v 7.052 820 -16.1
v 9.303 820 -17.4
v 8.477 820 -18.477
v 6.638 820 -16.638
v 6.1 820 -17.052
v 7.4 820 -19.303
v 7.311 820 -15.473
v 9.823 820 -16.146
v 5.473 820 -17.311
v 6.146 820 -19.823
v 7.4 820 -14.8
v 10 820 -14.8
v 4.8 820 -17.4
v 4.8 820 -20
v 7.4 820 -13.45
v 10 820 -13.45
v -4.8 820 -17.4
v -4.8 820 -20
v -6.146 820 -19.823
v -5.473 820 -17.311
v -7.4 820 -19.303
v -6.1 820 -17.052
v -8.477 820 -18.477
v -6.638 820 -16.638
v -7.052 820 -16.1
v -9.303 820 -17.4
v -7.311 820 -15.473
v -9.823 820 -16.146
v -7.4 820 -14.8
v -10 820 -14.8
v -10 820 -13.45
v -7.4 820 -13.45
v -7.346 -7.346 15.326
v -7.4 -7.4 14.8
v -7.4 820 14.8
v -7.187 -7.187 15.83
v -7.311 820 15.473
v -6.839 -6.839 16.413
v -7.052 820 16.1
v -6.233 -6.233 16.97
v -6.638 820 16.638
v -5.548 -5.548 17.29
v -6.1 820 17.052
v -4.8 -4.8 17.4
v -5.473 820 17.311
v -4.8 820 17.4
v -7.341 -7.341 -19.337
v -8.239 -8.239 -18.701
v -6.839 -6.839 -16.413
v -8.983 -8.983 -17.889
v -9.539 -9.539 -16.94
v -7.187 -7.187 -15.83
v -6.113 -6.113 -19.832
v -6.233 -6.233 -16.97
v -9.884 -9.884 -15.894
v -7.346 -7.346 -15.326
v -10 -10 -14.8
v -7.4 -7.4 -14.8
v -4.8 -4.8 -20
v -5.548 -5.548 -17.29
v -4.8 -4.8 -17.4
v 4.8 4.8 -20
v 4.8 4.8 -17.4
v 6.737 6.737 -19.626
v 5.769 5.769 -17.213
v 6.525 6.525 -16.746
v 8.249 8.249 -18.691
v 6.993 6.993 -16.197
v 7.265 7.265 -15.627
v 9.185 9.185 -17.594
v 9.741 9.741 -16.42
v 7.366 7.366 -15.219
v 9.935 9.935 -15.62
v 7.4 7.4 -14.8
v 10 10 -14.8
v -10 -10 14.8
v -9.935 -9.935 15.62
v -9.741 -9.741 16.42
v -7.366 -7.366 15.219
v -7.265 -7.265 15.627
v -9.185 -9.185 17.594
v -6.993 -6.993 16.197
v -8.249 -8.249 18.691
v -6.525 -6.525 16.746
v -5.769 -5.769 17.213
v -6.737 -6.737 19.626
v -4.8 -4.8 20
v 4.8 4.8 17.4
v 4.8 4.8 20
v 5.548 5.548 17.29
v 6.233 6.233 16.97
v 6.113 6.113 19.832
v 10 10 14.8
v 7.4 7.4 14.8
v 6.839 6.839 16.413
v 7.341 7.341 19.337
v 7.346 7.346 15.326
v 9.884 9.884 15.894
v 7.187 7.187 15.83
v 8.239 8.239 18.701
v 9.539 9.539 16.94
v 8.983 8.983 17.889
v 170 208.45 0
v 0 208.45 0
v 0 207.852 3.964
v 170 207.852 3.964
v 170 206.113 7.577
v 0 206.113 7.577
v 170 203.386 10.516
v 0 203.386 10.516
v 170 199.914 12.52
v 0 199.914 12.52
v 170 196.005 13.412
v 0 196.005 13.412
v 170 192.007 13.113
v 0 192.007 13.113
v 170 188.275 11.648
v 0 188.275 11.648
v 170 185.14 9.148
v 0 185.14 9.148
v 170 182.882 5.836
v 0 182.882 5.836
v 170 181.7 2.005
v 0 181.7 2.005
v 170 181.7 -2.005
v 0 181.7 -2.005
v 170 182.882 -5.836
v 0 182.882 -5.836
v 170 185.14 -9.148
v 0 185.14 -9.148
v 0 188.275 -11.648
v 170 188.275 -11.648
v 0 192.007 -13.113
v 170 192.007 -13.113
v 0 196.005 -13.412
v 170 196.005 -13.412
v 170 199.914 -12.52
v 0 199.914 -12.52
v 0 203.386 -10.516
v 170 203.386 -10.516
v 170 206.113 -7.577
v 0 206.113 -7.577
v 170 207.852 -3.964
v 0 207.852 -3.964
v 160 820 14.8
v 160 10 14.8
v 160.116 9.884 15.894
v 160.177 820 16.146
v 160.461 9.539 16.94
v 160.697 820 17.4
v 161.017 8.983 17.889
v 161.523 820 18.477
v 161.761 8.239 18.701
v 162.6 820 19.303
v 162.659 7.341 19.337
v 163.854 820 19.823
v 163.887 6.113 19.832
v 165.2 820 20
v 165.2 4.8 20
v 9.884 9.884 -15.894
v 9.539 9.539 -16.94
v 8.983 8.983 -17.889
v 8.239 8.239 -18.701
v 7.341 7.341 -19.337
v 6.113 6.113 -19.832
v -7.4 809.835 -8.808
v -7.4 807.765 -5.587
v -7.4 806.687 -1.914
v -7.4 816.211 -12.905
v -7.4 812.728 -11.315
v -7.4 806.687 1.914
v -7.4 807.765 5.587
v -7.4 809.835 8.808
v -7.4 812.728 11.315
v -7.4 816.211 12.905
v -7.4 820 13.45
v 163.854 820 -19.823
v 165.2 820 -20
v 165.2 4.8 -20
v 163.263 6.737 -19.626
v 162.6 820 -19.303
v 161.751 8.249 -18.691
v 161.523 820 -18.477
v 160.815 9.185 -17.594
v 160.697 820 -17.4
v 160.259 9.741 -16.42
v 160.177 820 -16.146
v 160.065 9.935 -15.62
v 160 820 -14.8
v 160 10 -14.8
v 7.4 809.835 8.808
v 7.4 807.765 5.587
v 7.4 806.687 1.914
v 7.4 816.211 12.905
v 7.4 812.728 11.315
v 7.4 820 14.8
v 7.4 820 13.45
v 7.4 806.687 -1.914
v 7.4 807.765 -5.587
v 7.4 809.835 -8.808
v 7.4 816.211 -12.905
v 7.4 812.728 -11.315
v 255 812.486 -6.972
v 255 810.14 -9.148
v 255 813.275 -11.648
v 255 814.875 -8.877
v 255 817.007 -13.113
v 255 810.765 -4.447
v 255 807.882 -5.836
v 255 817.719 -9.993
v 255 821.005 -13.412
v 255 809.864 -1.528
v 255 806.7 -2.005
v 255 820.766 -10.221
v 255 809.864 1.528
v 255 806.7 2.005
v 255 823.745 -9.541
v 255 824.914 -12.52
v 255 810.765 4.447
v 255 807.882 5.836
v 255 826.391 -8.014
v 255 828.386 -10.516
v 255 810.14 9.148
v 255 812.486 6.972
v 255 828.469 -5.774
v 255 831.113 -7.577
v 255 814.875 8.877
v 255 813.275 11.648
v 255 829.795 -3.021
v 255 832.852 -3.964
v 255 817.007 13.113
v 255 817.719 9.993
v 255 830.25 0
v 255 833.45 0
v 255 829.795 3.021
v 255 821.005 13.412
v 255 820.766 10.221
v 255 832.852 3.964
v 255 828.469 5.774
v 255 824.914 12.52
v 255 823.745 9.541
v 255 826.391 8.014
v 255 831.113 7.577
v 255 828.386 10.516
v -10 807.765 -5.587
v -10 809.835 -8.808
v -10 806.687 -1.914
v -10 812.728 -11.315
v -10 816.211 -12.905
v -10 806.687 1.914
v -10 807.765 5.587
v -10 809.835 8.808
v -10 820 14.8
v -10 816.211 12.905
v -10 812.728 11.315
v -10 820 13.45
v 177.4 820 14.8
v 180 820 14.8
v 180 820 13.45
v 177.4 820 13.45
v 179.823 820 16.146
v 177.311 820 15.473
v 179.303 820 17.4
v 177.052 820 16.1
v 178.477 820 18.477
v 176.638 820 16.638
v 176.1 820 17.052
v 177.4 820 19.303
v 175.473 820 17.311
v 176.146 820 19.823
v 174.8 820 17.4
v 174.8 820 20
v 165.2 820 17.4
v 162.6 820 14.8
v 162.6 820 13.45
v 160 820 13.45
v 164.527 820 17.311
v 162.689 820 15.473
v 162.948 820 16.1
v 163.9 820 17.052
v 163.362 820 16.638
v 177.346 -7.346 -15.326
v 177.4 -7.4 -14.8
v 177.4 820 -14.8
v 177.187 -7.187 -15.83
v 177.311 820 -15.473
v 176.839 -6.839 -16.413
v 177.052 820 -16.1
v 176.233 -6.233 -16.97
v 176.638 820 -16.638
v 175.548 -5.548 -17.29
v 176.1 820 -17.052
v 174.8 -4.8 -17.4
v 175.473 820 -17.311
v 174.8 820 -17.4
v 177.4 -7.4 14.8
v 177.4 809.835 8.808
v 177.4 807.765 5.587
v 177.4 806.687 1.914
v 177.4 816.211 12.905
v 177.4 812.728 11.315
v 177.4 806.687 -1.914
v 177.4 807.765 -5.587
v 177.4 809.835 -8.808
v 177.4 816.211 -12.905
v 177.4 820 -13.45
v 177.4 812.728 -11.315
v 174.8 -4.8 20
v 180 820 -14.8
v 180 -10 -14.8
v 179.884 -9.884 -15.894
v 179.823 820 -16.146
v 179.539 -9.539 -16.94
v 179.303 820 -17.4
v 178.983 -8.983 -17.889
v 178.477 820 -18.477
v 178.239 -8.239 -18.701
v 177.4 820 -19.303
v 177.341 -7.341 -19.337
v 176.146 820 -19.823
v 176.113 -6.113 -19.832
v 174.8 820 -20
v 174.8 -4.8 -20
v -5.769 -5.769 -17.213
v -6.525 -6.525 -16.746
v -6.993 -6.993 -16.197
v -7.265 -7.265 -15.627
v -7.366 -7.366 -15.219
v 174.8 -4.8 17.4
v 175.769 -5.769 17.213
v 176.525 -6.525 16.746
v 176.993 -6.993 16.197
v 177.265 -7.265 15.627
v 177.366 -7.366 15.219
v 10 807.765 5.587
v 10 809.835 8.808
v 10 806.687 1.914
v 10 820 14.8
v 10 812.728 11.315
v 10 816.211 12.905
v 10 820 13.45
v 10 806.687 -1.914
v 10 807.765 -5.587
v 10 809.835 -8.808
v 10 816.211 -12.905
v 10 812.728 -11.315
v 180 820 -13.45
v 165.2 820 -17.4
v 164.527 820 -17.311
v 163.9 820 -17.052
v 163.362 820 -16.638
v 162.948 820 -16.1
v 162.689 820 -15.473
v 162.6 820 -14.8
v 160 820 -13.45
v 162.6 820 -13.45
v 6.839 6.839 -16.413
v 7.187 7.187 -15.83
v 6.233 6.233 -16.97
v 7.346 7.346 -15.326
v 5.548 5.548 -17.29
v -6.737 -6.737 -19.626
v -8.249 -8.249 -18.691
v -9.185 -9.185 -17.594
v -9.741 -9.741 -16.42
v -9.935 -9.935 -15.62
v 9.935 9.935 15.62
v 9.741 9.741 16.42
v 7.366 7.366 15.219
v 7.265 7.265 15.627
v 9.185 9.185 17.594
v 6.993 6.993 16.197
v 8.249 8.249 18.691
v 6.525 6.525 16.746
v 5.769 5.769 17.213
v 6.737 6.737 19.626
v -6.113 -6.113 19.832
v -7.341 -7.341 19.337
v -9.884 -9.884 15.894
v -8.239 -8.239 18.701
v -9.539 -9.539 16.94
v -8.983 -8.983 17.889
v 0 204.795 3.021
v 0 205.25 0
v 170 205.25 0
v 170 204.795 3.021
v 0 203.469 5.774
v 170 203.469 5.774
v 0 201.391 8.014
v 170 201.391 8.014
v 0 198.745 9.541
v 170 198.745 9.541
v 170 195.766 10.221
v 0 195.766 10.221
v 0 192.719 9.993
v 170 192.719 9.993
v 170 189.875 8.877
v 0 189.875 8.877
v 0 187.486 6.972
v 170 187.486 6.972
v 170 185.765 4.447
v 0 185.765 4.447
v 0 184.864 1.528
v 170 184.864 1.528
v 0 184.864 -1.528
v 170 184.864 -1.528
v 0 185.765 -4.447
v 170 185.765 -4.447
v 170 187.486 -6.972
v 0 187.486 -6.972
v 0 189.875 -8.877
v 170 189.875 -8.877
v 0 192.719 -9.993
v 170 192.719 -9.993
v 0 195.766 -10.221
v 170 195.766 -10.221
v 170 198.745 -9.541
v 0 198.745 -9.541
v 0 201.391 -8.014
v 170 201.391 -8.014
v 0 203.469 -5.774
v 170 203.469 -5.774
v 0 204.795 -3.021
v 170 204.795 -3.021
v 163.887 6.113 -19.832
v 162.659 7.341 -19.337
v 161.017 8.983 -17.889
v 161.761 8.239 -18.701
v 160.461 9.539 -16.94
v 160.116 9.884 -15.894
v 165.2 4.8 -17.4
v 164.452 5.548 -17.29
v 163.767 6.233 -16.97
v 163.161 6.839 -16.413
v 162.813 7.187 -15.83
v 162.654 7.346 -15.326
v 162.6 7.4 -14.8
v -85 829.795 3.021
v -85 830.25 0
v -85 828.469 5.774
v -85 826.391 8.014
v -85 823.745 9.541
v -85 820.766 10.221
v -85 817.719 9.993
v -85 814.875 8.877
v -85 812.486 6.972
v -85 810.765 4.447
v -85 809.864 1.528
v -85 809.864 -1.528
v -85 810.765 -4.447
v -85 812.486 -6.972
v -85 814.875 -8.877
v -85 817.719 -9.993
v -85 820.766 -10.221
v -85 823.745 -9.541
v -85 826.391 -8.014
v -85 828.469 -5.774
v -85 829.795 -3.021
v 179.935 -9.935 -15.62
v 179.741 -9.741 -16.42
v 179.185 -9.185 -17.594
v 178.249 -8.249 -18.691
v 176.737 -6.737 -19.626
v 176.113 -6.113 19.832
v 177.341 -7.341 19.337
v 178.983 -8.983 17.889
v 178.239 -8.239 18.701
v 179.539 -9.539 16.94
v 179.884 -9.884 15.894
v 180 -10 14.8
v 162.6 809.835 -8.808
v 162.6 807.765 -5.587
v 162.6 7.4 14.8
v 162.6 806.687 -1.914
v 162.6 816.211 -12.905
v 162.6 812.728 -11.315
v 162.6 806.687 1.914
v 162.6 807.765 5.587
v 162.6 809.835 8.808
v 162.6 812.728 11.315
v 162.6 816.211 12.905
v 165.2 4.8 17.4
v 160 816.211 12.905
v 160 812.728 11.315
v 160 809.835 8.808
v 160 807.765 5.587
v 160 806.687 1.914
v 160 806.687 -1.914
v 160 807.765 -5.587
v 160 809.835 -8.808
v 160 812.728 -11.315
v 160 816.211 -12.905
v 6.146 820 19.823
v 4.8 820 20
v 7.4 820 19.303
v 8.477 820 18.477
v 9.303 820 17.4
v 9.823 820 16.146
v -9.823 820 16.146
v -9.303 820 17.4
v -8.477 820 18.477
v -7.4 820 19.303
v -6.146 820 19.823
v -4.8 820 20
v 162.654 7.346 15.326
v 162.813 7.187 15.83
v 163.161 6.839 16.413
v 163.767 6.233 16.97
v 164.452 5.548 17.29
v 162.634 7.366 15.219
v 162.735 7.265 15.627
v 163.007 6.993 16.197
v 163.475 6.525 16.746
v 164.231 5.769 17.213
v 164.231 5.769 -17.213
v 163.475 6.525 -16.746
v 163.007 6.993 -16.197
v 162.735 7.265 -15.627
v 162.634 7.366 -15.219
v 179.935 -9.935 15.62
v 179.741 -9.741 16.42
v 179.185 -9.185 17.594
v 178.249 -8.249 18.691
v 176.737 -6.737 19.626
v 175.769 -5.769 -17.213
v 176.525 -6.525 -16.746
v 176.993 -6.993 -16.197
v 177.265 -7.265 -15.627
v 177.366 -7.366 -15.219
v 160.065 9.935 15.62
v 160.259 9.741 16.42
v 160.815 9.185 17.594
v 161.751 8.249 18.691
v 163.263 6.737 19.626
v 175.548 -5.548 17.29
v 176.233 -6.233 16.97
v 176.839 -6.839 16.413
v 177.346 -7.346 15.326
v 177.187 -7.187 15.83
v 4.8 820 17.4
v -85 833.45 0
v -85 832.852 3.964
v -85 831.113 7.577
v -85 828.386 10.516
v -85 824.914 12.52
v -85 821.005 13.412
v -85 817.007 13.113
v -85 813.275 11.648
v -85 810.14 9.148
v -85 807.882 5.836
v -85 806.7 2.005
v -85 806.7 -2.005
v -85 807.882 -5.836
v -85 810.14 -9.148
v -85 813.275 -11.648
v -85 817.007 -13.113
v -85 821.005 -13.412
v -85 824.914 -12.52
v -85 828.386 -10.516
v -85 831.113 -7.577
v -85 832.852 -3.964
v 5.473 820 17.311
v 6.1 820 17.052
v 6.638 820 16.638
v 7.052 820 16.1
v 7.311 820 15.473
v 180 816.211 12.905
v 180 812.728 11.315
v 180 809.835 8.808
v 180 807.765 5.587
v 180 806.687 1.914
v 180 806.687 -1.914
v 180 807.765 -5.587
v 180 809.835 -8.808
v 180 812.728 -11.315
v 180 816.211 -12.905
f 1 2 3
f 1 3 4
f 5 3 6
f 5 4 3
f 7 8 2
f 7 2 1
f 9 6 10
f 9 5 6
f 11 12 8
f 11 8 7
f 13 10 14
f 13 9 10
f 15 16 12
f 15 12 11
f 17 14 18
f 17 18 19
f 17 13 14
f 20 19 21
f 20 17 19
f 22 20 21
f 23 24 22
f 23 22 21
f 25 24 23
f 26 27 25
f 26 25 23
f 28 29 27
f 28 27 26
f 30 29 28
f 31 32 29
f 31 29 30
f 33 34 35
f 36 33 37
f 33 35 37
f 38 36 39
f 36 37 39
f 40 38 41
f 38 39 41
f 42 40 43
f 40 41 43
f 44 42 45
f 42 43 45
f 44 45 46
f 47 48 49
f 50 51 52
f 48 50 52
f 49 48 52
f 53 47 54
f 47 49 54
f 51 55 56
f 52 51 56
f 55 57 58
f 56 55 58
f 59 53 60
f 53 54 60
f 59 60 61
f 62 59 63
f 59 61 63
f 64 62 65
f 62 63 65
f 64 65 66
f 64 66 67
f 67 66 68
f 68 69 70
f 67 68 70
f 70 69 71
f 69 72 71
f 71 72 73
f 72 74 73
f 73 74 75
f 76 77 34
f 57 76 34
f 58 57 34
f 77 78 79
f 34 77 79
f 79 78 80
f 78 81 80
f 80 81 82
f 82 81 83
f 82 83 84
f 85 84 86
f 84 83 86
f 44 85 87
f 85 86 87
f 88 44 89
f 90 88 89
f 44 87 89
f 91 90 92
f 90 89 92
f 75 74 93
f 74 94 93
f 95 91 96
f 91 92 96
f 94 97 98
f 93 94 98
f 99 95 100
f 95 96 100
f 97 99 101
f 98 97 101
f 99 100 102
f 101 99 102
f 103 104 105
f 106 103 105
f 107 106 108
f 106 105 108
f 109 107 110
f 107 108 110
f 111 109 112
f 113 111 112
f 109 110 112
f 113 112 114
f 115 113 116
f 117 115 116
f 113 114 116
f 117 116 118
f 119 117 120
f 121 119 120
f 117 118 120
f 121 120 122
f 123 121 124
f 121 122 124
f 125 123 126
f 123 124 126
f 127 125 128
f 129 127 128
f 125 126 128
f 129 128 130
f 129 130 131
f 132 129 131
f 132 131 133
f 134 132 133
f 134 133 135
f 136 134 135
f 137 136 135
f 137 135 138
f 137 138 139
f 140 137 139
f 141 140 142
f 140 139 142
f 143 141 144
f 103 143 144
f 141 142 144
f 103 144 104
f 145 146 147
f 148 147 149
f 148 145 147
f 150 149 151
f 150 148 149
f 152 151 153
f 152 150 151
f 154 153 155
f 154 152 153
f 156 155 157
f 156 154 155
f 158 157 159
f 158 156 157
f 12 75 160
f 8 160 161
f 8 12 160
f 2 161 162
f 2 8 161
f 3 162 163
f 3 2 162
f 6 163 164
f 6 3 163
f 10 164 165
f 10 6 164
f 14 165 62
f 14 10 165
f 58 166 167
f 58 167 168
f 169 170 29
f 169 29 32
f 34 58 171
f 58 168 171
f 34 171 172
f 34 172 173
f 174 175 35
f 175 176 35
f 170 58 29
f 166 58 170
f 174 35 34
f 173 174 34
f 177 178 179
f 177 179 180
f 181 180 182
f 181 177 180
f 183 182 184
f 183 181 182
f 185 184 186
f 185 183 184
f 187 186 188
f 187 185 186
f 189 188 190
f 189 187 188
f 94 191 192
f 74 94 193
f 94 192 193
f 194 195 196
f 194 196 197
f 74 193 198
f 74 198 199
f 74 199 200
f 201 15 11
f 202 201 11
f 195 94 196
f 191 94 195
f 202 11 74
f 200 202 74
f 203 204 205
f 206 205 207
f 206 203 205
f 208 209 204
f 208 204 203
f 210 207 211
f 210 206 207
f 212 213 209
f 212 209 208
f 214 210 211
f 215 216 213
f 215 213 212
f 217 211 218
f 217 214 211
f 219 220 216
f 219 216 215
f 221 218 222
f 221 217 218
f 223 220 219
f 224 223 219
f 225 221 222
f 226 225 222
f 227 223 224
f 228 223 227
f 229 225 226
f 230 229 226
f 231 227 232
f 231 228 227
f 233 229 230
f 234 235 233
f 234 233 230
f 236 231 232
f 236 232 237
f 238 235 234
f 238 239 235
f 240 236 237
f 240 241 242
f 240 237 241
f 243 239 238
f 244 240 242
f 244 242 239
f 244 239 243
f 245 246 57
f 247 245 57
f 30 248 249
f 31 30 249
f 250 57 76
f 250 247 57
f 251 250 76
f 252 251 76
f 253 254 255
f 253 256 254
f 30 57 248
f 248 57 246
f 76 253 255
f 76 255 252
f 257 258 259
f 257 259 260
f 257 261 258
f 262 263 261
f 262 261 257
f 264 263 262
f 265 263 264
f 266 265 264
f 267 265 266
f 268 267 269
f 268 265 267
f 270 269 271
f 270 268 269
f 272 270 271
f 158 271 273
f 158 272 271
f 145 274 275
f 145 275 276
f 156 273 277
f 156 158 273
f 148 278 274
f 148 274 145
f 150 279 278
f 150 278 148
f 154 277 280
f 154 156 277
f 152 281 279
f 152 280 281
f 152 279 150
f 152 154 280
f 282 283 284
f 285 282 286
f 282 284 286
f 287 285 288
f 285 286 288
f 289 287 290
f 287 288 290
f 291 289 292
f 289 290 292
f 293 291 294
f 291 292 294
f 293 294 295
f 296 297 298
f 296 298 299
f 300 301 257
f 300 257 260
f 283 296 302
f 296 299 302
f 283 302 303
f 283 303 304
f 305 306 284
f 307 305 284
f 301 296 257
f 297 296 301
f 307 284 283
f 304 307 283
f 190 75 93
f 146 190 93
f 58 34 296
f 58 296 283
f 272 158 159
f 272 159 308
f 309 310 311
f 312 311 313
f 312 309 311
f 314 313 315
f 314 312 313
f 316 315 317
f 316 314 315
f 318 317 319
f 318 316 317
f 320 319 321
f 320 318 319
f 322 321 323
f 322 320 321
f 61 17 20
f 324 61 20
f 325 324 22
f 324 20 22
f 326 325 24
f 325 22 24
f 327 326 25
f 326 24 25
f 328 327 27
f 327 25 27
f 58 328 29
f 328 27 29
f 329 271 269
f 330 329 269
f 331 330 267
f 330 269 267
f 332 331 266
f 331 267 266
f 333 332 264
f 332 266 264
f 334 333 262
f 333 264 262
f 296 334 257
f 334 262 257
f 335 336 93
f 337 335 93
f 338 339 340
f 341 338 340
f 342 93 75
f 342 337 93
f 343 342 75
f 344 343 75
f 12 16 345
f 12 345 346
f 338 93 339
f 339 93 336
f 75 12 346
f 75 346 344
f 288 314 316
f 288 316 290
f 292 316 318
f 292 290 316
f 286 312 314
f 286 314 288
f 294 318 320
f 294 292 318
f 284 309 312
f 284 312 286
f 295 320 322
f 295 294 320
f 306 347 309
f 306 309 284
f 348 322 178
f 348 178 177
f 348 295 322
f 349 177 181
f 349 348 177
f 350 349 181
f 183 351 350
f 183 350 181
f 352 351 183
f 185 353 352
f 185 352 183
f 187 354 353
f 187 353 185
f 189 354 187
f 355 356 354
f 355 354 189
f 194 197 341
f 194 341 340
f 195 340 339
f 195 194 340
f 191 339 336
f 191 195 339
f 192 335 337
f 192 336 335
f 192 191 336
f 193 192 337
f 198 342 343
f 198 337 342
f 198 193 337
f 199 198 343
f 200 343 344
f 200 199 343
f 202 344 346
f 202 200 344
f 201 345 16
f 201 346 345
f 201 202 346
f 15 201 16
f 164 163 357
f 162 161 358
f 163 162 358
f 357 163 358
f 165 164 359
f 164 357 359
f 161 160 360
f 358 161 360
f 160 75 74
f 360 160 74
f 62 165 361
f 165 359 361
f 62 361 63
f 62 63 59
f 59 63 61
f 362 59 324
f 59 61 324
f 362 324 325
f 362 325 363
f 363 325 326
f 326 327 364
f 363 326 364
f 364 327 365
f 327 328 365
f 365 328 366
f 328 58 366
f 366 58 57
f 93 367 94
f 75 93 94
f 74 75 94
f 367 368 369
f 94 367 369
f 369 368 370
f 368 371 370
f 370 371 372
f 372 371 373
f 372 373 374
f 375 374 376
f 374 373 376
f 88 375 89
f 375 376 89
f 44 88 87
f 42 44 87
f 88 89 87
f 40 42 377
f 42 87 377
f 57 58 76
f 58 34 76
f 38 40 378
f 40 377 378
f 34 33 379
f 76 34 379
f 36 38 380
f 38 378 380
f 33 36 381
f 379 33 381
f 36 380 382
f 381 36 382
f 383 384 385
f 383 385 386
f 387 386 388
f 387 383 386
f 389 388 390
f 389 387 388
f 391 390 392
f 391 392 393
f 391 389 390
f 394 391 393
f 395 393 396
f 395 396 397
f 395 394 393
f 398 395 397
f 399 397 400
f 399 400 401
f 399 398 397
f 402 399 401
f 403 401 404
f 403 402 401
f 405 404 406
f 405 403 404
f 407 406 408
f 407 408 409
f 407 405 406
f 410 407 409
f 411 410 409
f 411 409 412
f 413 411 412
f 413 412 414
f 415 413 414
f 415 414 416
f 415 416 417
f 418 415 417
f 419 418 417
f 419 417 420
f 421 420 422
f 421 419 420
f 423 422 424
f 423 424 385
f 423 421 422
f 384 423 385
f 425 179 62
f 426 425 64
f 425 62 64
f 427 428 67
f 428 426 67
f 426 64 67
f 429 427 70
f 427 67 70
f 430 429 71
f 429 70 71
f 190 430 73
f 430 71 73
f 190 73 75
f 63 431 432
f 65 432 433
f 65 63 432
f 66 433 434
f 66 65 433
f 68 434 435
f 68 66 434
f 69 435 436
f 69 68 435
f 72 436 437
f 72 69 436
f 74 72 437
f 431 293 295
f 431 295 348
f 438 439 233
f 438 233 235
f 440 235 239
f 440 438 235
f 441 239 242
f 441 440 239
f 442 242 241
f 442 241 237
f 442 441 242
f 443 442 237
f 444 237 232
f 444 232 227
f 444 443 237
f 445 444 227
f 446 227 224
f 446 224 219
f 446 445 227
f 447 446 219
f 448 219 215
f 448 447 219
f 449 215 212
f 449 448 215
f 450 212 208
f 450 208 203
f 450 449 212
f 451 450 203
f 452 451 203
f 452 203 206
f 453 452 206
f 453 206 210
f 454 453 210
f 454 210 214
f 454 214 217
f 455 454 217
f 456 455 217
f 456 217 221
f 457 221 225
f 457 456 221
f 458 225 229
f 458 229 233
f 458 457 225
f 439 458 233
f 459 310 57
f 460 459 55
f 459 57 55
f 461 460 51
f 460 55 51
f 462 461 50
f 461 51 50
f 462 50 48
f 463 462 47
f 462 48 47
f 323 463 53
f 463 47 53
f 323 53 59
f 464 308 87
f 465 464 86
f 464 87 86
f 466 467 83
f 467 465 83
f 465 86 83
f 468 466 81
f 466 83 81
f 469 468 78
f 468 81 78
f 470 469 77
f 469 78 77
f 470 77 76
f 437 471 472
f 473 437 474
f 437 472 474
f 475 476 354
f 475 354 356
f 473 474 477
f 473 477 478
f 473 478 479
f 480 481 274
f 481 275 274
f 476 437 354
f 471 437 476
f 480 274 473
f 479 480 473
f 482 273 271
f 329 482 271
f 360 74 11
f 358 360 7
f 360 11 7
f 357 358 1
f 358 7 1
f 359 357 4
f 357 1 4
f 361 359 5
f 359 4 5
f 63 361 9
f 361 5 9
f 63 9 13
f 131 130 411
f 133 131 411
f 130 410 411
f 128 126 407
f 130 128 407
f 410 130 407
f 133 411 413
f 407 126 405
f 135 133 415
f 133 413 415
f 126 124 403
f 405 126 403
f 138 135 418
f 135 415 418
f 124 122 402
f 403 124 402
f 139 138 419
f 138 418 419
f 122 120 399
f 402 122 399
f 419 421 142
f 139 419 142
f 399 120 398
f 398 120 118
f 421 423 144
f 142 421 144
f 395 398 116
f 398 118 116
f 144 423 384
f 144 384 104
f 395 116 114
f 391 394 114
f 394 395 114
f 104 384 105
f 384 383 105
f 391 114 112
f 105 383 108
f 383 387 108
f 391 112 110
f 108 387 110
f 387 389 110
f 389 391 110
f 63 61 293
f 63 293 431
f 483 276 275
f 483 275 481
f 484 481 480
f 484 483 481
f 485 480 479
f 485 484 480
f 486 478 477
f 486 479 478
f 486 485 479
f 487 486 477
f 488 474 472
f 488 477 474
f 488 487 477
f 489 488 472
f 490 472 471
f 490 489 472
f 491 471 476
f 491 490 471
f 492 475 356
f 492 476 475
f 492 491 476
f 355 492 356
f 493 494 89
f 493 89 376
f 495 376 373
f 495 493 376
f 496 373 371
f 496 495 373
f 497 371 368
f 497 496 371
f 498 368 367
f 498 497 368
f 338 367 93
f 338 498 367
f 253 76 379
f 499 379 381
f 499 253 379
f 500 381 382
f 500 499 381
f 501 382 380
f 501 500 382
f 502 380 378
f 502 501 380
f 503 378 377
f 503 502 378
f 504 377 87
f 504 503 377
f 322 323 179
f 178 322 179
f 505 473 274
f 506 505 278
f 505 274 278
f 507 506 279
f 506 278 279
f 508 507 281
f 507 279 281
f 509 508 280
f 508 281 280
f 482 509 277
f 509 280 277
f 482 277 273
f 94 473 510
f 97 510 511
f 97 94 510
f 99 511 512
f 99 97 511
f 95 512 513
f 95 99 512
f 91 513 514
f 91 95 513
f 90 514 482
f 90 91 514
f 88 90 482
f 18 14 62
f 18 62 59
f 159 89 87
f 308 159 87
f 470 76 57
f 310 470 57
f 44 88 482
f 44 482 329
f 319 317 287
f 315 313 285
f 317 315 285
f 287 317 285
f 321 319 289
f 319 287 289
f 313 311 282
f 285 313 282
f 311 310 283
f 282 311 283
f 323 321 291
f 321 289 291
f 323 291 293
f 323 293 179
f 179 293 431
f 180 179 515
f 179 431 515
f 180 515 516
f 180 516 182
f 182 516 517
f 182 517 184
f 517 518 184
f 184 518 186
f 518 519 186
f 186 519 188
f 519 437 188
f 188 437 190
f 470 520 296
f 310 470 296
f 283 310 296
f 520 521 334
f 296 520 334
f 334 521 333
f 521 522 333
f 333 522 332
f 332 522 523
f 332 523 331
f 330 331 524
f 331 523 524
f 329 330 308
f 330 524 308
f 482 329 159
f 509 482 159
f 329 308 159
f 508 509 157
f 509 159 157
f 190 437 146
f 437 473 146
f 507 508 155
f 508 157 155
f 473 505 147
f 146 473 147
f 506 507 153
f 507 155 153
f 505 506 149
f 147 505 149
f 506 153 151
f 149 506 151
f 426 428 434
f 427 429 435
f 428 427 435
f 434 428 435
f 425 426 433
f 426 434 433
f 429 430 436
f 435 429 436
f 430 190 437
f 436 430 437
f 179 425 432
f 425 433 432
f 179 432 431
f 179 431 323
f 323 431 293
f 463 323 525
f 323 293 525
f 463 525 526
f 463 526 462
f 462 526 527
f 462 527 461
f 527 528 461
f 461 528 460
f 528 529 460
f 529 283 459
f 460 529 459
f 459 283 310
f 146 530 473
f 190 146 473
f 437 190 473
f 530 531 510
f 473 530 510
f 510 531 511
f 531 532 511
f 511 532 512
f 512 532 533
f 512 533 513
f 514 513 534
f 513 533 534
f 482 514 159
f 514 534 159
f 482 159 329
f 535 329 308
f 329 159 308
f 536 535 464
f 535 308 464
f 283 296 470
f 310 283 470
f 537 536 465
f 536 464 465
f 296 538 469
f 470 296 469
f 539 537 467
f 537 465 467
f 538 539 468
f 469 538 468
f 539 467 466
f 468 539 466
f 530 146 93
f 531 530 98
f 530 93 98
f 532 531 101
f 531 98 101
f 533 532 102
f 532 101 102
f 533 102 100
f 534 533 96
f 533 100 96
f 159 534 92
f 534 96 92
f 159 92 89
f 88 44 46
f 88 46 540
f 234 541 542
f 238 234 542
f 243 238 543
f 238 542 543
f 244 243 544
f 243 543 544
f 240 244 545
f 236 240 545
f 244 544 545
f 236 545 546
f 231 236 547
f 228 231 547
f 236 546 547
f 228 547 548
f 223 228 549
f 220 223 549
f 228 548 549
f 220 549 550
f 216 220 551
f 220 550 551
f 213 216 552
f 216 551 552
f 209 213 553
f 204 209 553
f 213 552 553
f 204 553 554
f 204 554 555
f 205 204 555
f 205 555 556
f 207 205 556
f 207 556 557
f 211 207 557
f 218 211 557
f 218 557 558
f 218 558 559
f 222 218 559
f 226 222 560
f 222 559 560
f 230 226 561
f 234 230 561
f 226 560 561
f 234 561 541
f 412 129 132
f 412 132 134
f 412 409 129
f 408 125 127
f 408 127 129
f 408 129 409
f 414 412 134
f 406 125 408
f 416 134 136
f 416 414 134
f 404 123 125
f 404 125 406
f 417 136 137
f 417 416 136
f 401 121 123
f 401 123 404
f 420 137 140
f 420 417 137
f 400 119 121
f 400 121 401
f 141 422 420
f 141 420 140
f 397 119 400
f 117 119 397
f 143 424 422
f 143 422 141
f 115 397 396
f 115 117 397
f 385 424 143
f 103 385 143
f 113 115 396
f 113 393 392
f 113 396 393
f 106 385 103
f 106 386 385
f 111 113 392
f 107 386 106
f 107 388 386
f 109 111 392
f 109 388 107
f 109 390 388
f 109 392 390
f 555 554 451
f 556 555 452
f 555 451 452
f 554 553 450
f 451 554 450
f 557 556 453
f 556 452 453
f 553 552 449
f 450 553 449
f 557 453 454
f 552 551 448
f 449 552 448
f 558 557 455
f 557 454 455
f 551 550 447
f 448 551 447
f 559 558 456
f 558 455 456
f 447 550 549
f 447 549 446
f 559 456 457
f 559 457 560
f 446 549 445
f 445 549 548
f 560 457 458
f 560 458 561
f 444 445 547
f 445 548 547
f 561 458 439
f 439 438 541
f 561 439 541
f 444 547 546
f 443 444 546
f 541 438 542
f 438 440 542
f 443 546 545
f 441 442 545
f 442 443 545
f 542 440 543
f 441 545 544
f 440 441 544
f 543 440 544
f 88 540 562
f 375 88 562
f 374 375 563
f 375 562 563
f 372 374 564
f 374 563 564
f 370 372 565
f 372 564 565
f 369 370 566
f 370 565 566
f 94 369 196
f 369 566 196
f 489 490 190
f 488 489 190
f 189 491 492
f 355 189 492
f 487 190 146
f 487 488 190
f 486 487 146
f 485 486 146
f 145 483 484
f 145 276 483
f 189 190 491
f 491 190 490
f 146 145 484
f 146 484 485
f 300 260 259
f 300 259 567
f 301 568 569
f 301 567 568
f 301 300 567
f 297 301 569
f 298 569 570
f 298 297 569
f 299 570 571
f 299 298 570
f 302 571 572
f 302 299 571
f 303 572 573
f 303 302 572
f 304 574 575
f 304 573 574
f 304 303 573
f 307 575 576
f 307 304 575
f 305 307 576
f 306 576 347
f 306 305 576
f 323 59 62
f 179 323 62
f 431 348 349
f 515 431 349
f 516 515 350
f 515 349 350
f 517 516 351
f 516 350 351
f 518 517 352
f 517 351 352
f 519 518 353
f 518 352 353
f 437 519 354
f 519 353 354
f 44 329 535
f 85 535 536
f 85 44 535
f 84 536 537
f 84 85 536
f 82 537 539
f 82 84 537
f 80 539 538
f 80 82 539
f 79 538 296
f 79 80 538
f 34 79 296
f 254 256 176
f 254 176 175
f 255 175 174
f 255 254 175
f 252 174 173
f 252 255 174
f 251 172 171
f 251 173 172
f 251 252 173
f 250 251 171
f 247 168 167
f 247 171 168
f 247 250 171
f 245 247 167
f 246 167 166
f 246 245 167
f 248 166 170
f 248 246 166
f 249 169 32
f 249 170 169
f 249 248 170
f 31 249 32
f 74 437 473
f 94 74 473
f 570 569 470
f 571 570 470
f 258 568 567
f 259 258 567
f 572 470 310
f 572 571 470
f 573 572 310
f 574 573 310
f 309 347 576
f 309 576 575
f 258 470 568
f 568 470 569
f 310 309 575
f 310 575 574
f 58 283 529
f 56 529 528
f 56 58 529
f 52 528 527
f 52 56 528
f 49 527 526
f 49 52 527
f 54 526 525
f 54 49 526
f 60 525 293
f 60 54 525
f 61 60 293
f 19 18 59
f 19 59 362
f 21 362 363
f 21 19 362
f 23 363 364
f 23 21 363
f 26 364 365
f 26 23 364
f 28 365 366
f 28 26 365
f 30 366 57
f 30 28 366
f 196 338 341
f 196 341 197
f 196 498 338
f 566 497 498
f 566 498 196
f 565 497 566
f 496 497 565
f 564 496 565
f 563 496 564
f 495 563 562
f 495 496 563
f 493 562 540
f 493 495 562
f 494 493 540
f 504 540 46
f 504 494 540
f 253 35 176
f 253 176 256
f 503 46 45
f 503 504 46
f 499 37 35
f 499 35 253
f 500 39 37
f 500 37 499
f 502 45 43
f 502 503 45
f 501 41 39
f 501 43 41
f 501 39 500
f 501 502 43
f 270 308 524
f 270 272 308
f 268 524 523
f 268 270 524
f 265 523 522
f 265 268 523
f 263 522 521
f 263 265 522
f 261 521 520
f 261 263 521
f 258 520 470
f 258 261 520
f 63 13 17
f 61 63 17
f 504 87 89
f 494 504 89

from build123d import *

# Parameters (mm, degrees)
SKETCH11_R                               = 13.45
SKETCH11_R_2                             = 10.25
PIPE_26_9_X_3_2_1_DEPTH                  = 340
SKETCH11_ON_SEGMENT_2_R                  = 13.45
SKETCH11_ON_SEGMENT_2_R_2                = 10.25
PIPE_26_9_X_3_2_1_2_DEPTH                = 170
RECTANGULAR_TUBE_50_X_30_X_2_6_1_DEPTH   = 820
RECTANGULAR_TUBE_50_X_30_X_2_6_1_2_DEPTH = 820
RECTANGULAR_TUBE_50_X_30_X_2_6_2_DEPTH   = 170
BODY_3_RUN_ON_DEPTH                      = 10
BODY_5_RUN_ON_DEPTH                      = 10
BODY_4_RUN_ON_DEPTH                      = 10
BODY_START                               = 170
BODY_5_RUN_ON_2_DEPTH                    = 10


with BuildPart() as part:
    # Sketch11 → Pipe 26.9 X 3.2(1) (new body)
    with BuildSketch(Plane(origin=(-85, 820, 0), x_dir=(0, 1, 0), z_dir=(1, 0, 0))):
        Circle(SKETCH11_R)
        Circle(SKETCH11_R_2, mode=Mode.SUBTRACT)
    extrude(amount=PIPE_26_9_X_3_2_1_DEPTH)


with BuildPart() as body_2:
    # Sketch11 on segment 2 (carried to segment 2) → Pipe 26.9 X 3.2_1 2 (new body)
    with BuildSketch(Plane(origin=(0, 195, 0), x_dir=(0, 1, 0), z_dir=(1, 0, 0))):
        Circle(SKETCH11_ON_SEGMENT_2_R)
        Circle(SKETCH11_ON_SEGMENT_2_R_2, mode=Mode.SUBTRACT)
    extrude(amount=PIPE_26_9_X_3_2_1_2_DEPTH)


with BuildPart() as body_3:
    # Sketch12 → Rectangular tube 50 X 30 X 2.6(1) (new body)
    with BuildSketch(Plane(origin=(0, 0, 0), x_dir=(-1, 0, 0), z_dir=(0, 1, 0))):
        with BuildLine():
            Line((-4.8, -20), (4.8, -20))
            ThreePointArc((4.8, -20), (8.476955262, -18.476955262), (10, -14.8))
            Line((10, -14.8), (10, 14.8))
            ThreePointArc((10, 14.8), (8.476955262, 18.476955262), (4.8, 20))
            Line((4.8, 20), (-4.8, 20))
            ThreePointArc((-4.8, 20), (-8.476955262, 18.476955262), (-10, 14.8))
            Line((-10, 14.8), (-10, -14.8))
            ThreePointArc((-10, -14.8), (-8.476955262, -18.476955262), (-4.8, -20))
        make_face()
        with BuildLine():
            Line((-4.8, -17.4), (4.8, -17.4))
            ThreePointArc((4.8, -17.4), (6.638477631, -16.638477631), (7.4, -14.8))
            Line((7.4, -14.8), (7.4, 14.8))
            ThreePointArc((7.4, 14.8), (6.638477631, 16.638477631), (4.8, 17.4))
            Line((4.8, 17.4), (-4.8, 17.4))
            ThreePointArc((-4.8, 17.4), (-6.638477631, 16.638477631), (-7.4, 14.8))
            Line((-7.4, 14.8), (-7.4, -14.8))
            ThreePointArc((-7.4, -14.8), (-6.638477631, -16.638477631), (-4.8, -17.4))
        make_face(mode=Mode.SUBTRACT)
    extrude(amount=RECTANGULAR_TUBE_50_X_30_X_2_6_1_DEPTH)

    # Sketch12 → body 3 run on (add)
    with BuildSketch(Plane(origin=(0, 0, 0), x_dir=(-1, 0, 0), z_dir=(0, 1, 0))):
        with BuildLine():
            Line((-4.8, -20), (4.8, -20))
            ThreePointArc((4.8, -20), (8.476955262, -18.476955262), (10, -14.8))
            Line((10, -14.8), (10, 14.8))
            ThreePointArc((10, 14.8), (8.476955262, 18.476955262), (4.8, 20))
            Line((4.8, 20), (-4.8, 20))
            ThreePointArc((-4.8, 20), (-8.476955262, 18.476955262), (-10, 14.8))
            Line((-10, 14.8), (-10, -14.8))
            ThreePointArc((-10, -14.8), (-8.476955262, -18.476955262), (-4.8, -20))
        make_face()
        with BuildLine():
            Line((-4.8, -17.4), (4.8, -17.4))
            ThreePointArc((4.8, -17.4), (6.638477631, -16.638477631), (7.4, -14.8))
            Line((7.4, -14.8), (7.4, 14.8))
            ThreePointArc((7.4, 14.8), (6.638477631, 16.638477631), (4.8, 17.4))
            Line((4.8, 17.4), (-4.8, 17.4))
            ThreePointArc((-4.8, 17.4), (-6.638477631, 16.638477631), (-7.4, 14.8))
            Line((-7.4, 14.8), (-7.4, -14.8))
            ThreePointArc((-7.4, -14.8), (-6.638477631, -16.638477631), (-4.8, -17.4))
        make_face(mode=Mode.SUBTRACT)
    extrude(amount=-BODY_3_RUN_ON_DEPTH)

    # Trim/Extend1
    split(bisect_by=Plane(origin=(0, 0, 0), x_dir=(-0.707106781, -0.707106781, 0), z_dir=(-0.707106781, 0.707106781, 0)), keep=Keep.TOP)

    # Trim/Extend4: cut back where it meets the other member's skin (coped)
    split(bisect_by=part.part.faces().sort_by_distance((85, 806.55, 0))[0], keep=Keep.TOP)


with BuildPart() as body_4:
    # Sketch12 on segment 2 (carried to segment 2) → Rectangular tube 50 X 30 X 2.6_1 2 (new body)
    with BuildSketch(Plane(origin=(170, 0, 0), x_dir=(-1, 0, 0), z_dir=(0, 1, 0))):
        with BuildLine():
            Line((-4.8, -20), (4.8, -20))
            ThreePointArc((4.8, -20), (8.476955262, -18.476955262), (10, -14.8))
            Line((10, -14.8), (10, 14.8))
            ThreePointArc((10, 14.8), (8.476955262, 18.476955262), (4.8, 20))
            Line((4.8, 20), (-4.8, 20))
            ThreePointArc((-4.8, 20), (-8.476955262, 18.476955262), (-10, 14.8))
            Line((-10, 14.8), (-10, -14.8))
            ThreePointArc((-10, -14.8), (-8.476955262, -18.476955262), (-4.8, -20))
        make_face()
        with BuildLine():
            Line((-4.8, -17.4), (4.8, -17.4))
            ThreePointArc((4.8, -17.4), (6.638477631, -16.638477631), (7.4, -14.8))
            Line((7.4, -14.8), (7.4, 14.8))
            ThreePointArc((7.4, 14.8), (6.638477631, 16.638477631), (4.8, 17.4))
            Line((4.8, 17.4), (-4.8, 17.4))
            ThreePointArc((-4.8, 17.4), (-6.638477631, 16.638477631), (-7.4, 14.8))
            Line((-7.4, 14.8), (-7.4, -14.8))
            ThreePointArc((-7.4, -14.8), (-6.638477631, -16.638477631), (-4.8, -17.4))
        make_face(mode=Mode.SUBTRACT)
    extrude(amount=RECTANGULAR_TUBE_50_X_30_X_2_6_1_2_DEPTH)

    # Sketch12 on segment 2 (carried to segment 2) → body 4 run on (add)
    with BuildSketch(Plane(origin=(170, 0, 0), x_dir=(-1, 0, 0), z_dir=(0, 1, 0))):
        with BuildLine():
            Line((-4.8, -20), (4.8, -20))
            ThreePointArc((4.8, -20), (8.476955262, -18.476955262), (10, -14.8))
            Line((10, -14.8), (10, 14.8))
            ThreePointArc((10, 14.8), (8.476955262, 18.476955262), (4.8, 20))
            Line((4.8, 20), (-4.8, 20))
            ThreePointArc((-4.8, 20), (-8.476955262, 18.476955262), (-10, 14.8))
            Line((-10, 14.8), (-10, -14.8))
            ThreePointArc((-10, -14.8), (-8.476955262, -18.476955262), (-4.8, -20))
        make_face()
        with BuildLine():
            Line((-4.8, -17.4), (4.8, -17.4))
            ThreePointArc((4.8, -17.4), (6.638477631, -16.638477631), (7.4, -14.8))
            Line((7.4, -14.8), (7.4, 14.8))
            ThreePointArc((7.4, 14.8), (6.638477631, 16.638477631), (4.8, 17.4))
            Line((4.8, 17.4), (-4.8, 17.4))
            ThreePointArc((-4.8, 17.4), (-6.638477631, 16.638477631), (-7.4, 14.8))
            Line((-7.4, 14.8), (-7.4, -14.8))
            ThreePointArc((-7.4, -14.8), (-6.638477631, -16.638477631), (-4.8, -17.4))
        make_face(mode=Mode.SUBTRACT)
    extrude(amount=-BODY_4_RUN_ON_DEPTH)

    # Trim/Extend2
    split(bisect_by=Plane(origin=(170, 0, 0), x_dir=(-0.707106781, 0.707106781, 0), z_dir=(0.707106781, 0.707106781, 0)), keep=Keep.TOP)

    # Trim/Extend4: cut back where it meets the other member's skin (coped)
    split(bisect_by=part.part.faces().sort_by_distance((85, 806.55, 0))[0], keep=Keep.TOP)


with BuildPart() as body_5:
    # Sketch13 → Rectangular tube 50 X 30 X 2.6(2) (new body)
    with BuildSketch(Plane.YZ):
        with BuildLine():
            Line((-4.8, -20), (4.8, -20))
            ThreePointArc((4.8, -20), (8.476955262, -18.476955262), (10, -14.8))
            Line((10, -14.8), (10, 14.8))
            ThreePointArc((10, 14.8), (8.476955262, 18.476955262), (4.8, 20))
            Line((4.8, 20), (-4.8, 20))
            ThreePointArc((-4.8, 20), (-8.476955262, 18.476955262), (-10, 14.8))
            Line((-10, 14.8), (-10, -14.8))
            ThreePointArc((-10, -14.8), (-8.476955262, -18.476955262), (-4.8, -20))
        make_face()
        with BuildLine():
            Line((-4.8, -17.4), (4.8, -17.4))
            ThreePointArc((4.8, -17.4), (6.638477631, -16.638477631), (7.4, -14.8))
            Line((7.4, -14.8), (7.4, 14.8))
            ThreePointArc((7.4, 14.8), (6.638477631, 16.638477631), (4.8, 17.4))
            Line((4.8, 17.4), (-4.8, 17.4))
            ThreePointArc((-4.8, 17.4), (-6.638477631, 16.638477631), (-7.4, 14.8))
            Line((-7.4, 14.8), (-7.4, -14.8))
            ThreePointArc((-7.4, -14.8), (-6.638477631, -16.638477631), (-4.8, -17.4))
        make_face(mode=Mode.SUBTRACT)
    extrude(amount=RECTANGULAR_TUBE_50_X_30_X_2_6_2_DEPTH)

    # Sketch13 → body 5 run on (add)
    with BuildSketch(Plane.YZ):
        with BuildLine():
            Line((-4.8, -20), (4.8, -20))
            ThreePointArc((4.8, -20), (8.476955262, -18.476955262), (10, -14.8))
            Line((10, -14.8), (10, 14.8))
            ThreePointArc((10, 14.8), (8.476955262, 18.476955262), (4.8, 20))
            Line((4.8, 20), (-4.8, 20))
            ThreePointArc((-4.8, 20), (-8.476955262, 18.476955262), (-10, 14.8))
            Line((-10, 14.8), (-10, -14.8))
            ThreePointArc((-10, -14.8), (-8.476955262, -18.476955262), (-4.8, -20))
        make_face()
        with BuildLine():
            Line((-4.8, -17.4), (4.8, -17.4))
            ThreePointArc((4.8, -17.4), (6.638477631, -16.638477631), (7.4, -14.8))
            Line((7.4, -14.8), (7.4, 14.8))
            ThreePointArc((7.4, 14.8), (6.638477631, 16.638477631), (4.8, 17.4))
            Line((4.8, 17.4), (-4.8, 17.4))
            ThreePointArc((-4.8, 17.4), (-6.638477631, 16.638477631), (-7.4, 14.8))
            Line((-7.4, 14.8), (-7.4, -14.8))
            ThreePointArc((-7.4, -14.8), (-6.638477631, -16.638477631), (-4.8, -17.4))
        make_face(mode=Mode.SUBTRACT)
    extrude(amount=-BODY_5_RUN_ON_DEPTH)

    # Trim/Extend1
    split(bisect_by=Plane(origin=(0, 0, 0), x_dir=(0.707106781, 0.707106781, 0), z_dir=(0.707106781, -0.707106781, 0)), keep=Keep.TOP)

    # Sketch13 → body 5 run on 2 (add)
    with BuildSketch(Plane.YZ.offset(BODY_START)):
        with BuildLine():
            Line((-4.8, -20), (4.8, -20))
            ThreePointArc((4.8, -20), (8.476955262, -18.476955262), (10, -14.8))
            Line((10, -14.8), (10, 14.8))
            ThreePointArc((10, 14.8), (8.476955262, 18.476955262), (4.8, 20))
            Line((4.8, 20), (-4.8, 20))
            ThreePointArc((-4.8, 20), (-8.476955262, 18.476955262), (-10, 14.8))
            Line((-10, 14.8), (-10, -14.8))
            ThreePointArc((-10, -14.8), (-8.476955262, -18.476955262), (-4.8, -20))
        make_face()
        with BuildLine():
            Line((-4.8, -17.4), (4.8, -17.4))
            ThreePointArc((4.8, -17.4), (6.638477631, -16.638477631), (7.4, -14.8))
            Line((7.4, -14.8), (7.4, 14.8))
            ThreePointArc((7.4, 14.8), (6.638477631, 16.638477631), (4.8, 17.4))
            Line((4.8, 17.4), (-4.8, 17.4))
            ThreePointArc((-4.8, 17.4), (-6.638477631, 16.638477631), (-7.4, 14.8))
            Line((-7.4, 14.8), (-7.4, -14.8))
            ThreePointArc((-7.4, -14.8), (-6.638477631, -16.638477631), (-4.8, -17.4))
        make_face(mode=Mode.SUBTRACT)
    extrude(amount=BODY_5_RUN_ON_2_DEPTH)

    # Trim/Extend2
    split(bisect_by=Plane(origin=(170, 0, 0), x_dir=(0.707106781, -0.707106781, 0), z_dir=(-0.707106781, -0.707106781, 0)), keep=Keep.TOP)


solid = Compound([part.part, body_2.part, body_3.part, body_4.part, body_5.part])
